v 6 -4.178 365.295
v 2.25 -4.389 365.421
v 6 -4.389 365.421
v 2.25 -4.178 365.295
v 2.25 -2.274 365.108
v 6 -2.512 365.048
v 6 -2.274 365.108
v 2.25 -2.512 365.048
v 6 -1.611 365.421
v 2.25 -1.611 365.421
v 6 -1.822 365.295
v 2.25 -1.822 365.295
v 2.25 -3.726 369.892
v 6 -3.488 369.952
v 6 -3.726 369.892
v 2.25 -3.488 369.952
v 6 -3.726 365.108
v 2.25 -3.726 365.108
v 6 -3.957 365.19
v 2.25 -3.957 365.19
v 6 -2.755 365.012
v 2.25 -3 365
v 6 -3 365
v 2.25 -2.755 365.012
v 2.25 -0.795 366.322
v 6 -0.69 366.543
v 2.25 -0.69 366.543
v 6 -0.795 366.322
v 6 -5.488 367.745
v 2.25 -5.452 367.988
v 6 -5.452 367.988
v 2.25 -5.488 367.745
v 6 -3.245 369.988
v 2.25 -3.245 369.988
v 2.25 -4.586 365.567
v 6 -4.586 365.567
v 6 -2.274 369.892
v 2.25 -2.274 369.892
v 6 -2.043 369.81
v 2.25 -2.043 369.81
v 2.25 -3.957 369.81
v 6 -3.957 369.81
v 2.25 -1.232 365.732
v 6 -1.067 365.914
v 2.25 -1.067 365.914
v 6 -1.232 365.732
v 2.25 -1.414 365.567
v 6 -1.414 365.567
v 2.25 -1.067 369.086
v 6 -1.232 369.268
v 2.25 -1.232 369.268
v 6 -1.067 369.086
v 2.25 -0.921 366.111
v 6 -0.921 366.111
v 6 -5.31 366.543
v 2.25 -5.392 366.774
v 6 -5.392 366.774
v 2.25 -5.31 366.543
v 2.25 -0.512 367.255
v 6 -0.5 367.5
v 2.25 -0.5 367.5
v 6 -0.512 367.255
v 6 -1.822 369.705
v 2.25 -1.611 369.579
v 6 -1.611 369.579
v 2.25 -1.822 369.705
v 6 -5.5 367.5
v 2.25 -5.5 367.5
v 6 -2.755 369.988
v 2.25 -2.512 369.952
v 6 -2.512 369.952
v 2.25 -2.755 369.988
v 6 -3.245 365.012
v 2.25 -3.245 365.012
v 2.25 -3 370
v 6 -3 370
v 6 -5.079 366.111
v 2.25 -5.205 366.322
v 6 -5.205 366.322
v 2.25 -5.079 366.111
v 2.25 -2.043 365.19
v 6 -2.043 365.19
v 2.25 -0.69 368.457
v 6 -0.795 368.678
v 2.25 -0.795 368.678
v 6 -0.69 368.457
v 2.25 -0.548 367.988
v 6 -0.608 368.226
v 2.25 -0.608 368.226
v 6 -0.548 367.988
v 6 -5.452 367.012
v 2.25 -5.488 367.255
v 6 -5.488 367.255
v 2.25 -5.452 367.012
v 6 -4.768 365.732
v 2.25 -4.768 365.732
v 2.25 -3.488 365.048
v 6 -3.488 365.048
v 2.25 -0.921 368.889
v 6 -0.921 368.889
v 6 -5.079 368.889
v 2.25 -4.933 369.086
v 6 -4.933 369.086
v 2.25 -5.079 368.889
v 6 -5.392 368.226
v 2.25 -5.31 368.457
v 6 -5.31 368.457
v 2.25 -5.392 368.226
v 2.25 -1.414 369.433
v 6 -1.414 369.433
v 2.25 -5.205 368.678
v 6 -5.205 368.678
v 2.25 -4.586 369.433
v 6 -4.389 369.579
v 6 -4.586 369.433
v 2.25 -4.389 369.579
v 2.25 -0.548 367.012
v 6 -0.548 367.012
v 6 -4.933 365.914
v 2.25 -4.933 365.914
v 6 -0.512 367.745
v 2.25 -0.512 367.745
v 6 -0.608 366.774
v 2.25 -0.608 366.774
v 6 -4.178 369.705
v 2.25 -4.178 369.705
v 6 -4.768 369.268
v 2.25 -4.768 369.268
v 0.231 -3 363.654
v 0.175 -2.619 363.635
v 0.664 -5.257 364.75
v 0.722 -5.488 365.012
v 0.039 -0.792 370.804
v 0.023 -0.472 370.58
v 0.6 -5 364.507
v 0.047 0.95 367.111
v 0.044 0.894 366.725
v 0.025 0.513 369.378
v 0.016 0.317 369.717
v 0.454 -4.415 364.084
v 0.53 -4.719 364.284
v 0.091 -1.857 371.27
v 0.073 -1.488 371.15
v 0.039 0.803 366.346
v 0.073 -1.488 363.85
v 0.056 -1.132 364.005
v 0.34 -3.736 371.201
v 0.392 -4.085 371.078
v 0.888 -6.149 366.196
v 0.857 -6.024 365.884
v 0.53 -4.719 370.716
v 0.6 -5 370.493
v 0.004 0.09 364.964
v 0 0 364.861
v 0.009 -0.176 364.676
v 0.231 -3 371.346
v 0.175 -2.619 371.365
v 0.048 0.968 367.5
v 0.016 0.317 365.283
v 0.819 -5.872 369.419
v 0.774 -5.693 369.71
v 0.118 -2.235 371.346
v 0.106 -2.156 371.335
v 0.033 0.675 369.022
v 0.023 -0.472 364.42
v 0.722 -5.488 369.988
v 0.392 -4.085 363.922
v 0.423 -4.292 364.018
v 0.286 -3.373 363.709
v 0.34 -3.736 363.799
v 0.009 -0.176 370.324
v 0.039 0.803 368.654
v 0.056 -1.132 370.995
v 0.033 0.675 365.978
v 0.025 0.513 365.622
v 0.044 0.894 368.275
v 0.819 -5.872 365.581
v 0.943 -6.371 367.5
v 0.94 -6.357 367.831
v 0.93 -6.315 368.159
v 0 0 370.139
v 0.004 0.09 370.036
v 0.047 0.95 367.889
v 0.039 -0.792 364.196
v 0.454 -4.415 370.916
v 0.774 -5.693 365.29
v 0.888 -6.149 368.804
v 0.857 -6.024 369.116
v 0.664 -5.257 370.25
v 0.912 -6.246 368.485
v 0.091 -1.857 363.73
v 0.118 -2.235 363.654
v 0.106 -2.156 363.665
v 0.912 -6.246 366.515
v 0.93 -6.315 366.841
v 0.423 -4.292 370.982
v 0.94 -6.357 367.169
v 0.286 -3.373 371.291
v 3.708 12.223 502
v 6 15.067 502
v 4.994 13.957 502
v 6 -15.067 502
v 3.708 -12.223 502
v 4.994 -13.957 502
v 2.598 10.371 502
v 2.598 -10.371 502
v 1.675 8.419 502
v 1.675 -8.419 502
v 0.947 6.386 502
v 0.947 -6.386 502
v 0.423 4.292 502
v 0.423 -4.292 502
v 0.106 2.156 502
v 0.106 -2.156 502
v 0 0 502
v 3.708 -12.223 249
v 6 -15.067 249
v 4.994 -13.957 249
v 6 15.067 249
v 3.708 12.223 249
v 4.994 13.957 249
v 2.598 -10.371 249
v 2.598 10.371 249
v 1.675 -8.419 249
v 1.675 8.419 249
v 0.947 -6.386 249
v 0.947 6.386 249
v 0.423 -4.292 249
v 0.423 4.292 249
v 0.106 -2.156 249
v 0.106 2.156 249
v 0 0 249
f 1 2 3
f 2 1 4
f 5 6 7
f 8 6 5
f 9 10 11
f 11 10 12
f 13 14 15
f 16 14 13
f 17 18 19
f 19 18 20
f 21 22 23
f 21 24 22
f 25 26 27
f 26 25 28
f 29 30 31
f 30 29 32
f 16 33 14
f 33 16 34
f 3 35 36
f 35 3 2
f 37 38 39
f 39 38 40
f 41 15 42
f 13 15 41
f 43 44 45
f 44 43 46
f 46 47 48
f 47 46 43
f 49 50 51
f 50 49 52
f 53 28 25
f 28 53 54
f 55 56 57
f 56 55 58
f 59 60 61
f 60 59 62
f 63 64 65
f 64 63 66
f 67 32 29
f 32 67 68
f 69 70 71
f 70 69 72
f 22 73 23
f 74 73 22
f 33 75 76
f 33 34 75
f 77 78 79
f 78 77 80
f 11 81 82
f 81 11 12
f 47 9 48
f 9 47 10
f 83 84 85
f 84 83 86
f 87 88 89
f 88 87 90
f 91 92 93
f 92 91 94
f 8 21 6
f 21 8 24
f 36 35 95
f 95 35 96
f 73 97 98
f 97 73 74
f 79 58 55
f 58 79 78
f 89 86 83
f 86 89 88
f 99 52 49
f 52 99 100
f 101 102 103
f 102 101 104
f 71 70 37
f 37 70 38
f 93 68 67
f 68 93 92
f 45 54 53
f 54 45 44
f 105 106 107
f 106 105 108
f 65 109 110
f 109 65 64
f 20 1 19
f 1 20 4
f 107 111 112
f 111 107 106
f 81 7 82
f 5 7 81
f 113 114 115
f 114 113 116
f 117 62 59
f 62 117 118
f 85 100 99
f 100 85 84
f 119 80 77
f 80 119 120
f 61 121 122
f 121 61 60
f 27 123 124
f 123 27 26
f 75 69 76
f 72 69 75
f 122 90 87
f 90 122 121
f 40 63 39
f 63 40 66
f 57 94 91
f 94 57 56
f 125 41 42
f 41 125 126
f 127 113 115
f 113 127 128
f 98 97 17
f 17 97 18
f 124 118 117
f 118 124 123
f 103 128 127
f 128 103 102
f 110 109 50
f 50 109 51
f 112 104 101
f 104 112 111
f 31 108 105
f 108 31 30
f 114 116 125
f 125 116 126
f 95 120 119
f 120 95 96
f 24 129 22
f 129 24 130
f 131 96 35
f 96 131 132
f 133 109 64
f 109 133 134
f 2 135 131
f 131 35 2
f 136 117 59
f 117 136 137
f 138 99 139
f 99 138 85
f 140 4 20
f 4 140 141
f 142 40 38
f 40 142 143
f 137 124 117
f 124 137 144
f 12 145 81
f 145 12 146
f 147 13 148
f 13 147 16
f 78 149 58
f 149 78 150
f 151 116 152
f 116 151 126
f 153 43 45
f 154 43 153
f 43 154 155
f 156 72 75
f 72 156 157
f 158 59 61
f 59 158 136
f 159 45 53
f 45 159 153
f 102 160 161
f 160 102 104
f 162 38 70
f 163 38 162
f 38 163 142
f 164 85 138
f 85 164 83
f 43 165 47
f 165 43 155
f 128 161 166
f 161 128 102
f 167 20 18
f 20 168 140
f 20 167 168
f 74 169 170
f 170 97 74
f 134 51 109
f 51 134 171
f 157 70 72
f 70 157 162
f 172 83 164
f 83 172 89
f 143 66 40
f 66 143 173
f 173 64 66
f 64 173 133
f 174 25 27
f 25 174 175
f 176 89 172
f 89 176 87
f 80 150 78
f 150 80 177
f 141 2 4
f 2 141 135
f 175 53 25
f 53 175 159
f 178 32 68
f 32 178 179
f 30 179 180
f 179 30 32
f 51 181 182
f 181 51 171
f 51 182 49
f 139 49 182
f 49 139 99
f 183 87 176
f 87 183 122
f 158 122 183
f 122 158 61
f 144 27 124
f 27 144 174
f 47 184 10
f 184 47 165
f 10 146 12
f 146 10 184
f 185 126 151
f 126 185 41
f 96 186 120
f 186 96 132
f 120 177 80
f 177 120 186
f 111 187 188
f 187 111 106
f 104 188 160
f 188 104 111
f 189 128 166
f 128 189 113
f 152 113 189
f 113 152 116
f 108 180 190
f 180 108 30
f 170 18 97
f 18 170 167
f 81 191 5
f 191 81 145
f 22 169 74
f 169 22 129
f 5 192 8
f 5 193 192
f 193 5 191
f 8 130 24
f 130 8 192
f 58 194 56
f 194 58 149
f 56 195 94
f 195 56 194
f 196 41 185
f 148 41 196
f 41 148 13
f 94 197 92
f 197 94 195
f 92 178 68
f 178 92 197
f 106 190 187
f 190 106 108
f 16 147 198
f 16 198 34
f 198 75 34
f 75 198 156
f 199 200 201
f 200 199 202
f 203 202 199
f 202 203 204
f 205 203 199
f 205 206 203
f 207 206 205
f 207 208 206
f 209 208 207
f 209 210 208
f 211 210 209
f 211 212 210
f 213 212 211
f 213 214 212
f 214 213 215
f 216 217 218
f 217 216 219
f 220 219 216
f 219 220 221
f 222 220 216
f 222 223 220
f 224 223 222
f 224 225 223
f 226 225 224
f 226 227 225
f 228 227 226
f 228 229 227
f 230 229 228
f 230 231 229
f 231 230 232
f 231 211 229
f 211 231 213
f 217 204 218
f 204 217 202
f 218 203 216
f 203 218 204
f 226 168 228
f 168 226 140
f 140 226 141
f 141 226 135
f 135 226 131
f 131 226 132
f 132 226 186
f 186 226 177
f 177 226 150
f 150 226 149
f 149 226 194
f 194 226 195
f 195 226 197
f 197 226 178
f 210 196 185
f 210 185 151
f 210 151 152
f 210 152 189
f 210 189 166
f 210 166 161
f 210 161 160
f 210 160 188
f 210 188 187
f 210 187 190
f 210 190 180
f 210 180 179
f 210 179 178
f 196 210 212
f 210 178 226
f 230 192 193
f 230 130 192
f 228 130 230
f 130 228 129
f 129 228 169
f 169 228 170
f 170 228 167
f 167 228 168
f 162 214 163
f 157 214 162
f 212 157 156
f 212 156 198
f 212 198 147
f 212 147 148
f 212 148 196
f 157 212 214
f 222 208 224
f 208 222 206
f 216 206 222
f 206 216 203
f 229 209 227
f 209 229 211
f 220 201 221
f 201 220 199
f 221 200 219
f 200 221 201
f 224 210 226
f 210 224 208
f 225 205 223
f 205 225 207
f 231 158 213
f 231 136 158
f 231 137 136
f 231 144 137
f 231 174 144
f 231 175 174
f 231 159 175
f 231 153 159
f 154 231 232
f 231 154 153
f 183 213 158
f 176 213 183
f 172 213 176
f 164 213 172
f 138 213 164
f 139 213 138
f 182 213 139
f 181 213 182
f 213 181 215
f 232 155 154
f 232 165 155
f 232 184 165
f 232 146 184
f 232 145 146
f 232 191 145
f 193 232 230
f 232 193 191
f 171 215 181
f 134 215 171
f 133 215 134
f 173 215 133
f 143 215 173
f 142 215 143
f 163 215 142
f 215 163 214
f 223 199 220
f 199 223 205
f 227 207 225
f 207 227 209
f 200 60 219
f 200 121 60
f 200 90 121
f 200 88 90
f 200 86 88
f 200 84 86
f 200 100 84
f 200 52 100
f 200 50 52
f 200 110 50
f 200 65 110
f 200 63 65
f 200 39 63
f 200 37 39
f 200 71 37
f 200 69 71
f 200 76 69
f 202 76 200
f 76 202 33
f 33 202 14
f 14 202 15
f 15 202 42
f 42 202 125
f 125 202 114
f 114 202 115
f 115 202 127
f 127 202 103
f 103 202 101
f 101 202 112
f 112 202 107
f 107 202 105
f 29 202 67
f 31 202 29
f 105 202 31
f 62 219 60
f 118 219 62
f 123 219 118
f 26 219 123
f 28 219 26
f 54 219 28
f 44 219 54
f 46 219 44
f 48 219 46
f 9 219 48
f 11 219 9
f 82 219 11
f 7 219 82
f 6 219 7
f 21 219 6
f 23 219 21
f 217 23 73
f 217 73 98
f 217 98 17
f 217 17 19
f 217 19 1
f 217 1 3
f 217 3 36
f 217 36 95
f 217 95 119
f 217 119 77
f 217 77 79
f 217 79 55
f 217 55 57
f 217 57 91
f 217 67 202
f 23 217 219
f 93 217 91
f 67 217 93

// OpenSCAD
$fn=64;
width=730;
height=6;
radius=22;
boden_breite=29;
loch_d=5;

kabel=5;

loch1=15;
loch2=192.5;
loch3=367.5;
loch4=543.5;
loch5=width- 14;

teil1=250;
teil2=500;

teil1_an=false;
teil2_an=true;
teil3_an=false;

difference()
{
    translate([radius,0,0])
    cylinder(r=radius, h=width);
    translate([height,-radius - height/2,-height])
    cube([radius*2,radius*2 + height, width+height*2]);

    translate([0,-1,0])
    {
        translate([0,0,loch1])
        bohrer();

        translate([0,0,loch2])
        bohrer();

        translate([0,-2,0])
        translate([0,0,loch3])
        bohrer();

        translate([0,0,loch4])
        bohrer();

        translate([0,0,loch5])
        bohrer();
    }

    translate([2,-50,loch1+5])
    cube([kabel,100,kabel]);

    if (teil1_an)
    {
        translate([-25,-25,teil1])
        cube([50,50,5000]);
    }
    if (teil2_an)
    {
        translate([-25,-25,teil2+2])
        cube([50,50,5000]);
        translate([-25,-25,-1])
        cube([50,50,teil1]);
    }
    if (teil3_an)
    {
        translate([-25,-25,-0.01])
        cube([50,50,teil2]);
    }
}


/*
translate([-boden_breite/2,-boden_breite/2,0])
cube([boden_breite,boden_breite,boden_breite]);
*/

module bohrer()
{
    rotate([0,90,0])
    translate([0,0,-height/2])
    cylinder(d=loch_d, h=height*2);
    
    kegelloch();
}

module kegelloch()
{
    rotate([0,90,0])
    cylinder(d1=8, d2=0, h=6);
}
